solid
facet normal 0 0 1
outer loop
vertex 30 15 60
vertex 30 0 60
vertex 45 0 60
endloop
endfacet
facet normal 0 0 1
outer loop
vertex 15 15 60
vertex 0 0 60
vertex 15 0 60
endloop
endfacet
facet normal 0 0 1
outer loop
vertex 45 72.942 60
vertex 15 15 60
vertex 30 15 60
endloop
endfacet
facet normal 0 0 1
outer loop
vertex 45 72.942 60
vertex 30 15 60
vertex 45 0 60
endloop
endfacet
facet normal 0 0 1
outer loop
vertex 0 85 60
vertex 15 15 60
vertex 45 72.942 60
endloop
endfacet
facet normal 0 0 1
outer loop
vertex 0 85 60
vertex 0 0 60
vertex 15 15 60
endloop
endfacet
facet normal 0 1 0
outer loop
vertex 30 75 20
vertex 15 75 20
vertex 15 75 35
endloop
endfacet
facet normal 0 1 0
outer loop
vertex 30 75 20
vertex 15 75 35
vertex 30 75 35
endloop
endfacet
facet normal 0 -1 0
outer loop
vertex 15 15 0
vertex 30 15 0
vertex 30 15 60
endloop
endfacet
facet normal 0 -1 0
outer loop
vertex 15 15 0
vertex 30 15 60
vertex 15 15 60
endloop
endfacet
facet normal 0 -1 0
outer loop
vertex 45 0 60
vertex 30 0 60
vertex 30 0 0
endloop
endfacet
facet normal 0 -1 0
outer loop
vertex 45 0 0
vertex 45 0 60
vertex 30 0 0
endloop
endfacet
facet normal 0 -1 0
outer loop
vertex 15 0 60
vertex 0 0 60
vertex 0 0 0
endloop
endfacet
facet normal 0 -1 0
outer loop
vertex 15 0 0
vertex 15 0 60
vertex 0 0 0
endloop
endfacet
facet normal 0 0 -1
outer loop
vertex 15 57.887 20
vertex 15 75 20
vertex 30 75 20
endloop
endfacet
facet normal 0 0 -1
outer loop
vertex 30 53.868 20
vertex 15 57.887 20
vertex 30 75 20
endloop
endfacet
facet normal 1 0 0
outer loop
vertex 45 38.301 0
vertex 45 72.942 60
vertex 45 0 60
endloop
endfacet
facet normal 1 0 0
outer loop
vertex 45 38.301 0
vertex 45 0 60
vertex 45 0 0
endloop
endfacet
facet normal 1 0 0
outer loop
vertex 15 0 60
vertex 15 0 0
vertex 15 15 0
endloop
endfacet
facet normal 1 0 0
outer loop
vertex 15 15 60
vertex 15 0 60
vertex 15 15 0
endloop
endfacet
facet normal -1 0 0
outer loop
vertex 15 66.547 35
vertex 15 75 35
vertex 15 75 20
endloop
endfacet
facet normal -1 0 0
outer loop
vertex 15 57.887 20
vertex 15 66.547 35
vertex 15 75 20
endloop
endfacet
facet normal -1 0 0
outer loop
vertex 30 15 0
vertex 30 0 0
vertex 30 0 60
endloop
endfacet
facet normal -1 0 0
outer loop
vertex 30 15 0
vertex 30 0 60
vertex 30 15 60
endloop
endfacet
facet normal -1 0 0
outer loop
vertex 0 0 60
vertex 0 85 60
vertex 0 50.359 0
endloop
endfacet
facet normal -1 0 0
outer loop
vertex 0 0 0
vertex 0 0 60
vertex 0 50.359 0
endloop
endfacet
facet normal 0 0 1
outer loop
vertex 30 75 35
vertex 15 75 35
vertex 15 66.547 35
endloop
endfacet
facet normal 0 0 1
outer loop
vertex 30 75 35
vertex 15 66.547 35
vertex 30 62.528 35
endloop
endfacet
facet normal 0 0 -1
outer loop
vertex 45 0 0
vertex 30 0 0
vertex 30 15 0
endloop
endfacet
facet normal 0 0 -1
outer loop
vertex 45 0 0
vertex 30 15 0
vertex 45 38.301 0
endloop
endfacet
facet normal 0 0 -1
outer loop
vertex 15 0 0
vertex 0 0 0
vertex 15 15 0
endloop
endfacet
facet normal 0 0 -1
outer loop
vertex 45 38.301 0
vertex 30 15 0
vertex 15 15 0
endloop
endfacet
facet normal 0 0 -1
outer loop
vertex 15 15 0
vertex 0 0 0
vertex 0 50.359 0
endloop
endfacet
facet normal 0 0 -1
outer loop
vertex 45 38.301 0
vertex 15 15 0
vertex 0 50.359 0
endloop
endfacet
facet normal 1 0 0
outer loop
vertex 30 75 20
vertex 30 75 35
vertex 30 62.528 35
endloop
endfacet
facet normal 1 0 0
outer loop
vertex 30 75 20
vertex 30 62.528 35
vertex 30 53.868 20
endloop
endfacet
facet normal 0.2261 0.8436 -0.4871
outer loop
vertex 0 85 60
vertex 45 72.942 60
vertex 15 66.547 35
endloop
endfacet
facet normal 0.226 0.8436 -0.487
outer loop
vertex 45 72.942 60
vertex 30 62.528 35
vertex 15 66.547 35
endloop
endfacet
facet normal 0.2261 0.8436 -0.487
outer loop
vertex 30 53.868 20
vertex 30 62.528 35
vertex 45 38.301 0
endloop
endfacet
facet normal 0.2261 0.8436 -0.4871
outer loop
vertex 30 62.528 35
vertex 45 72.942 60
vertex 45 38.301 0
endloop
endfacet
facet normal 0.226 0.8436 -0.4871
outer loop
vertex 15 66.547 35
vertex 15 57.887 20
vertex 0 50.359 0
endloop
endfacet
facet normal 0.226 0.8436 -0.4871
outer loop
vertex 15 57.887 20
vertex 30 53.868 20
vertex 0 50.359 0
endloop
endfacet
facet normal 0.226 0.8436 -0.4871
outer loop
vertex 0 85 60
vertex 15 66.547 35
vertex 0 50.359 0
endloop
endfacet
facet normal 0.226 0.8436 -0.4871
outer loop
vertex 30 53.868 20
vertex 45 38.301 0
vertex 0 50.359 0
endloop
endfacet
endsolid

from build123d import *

# Parameters (mm, degrees)
ESBO_O1_W                = 60
ESBO_O1_H                = 85
RESSALTO_EXTRUS_O1_DEPTH = 45
CORTE_EXTRUS_O1_REACH    = 102.9
ESBO_O7_W                = 70
ESBO_O7_H                = 90
RESSALTO_EXTRUS_O2_REACH = 108.066
ESBO_O8_W                = 15
ESBO_O8_H                = 15
CORTE_EXTRUS_O2_REACH    = 115.358
ESBO_O9_W                = 15
ESBO_O9_H                = 15


with BuildPart() as part:
    # Esboço1 → Ressalto-extrusão1 (new body)
    with BuildSketch(Plane(origin=(0, 0, 0), x_dir=(0, 0, -1), z_dir=(1, 0, 0))):
        with Locations((-30, 42.5)):
            Rectangle(ESBO_O1_W, ESBO_O1_H)
    extrude(amount=RESSALTO_EXTRUS_O1_DEPTH)

    # Esboço7 → Corte-extrusão1 (cut, up to next)
    with BuildSketch(Plane(origin=(9.603131429, 35.839374403, -20.691872459), x_dir=(-0.9741169476962972, 0.19576038710152016, -0.11302231218972801), z_dir=(-0.22604462437945605, -0.8436100229619508, 0.48705847384814865)), mode=Mode.PRIVATE) as corte_extrus_o1_sk1:
        with Locations((-10.222277995, -55.295886242)):
            Rectangle(ESBO_O7_W, ESBO_O7_H)
    corte_extrus_o1_tool1 = extrude(corte_extrus_o1_sk1.sketch, amount=-CORTE_EXTRUS_O1_REACH, mode=Mode.PRIVATE) & part.part
    add(corte_extrus_o1_tool1.solids().sort_by_distance((19.560826, 61.4862, 28.351115))[0], mode=Mode.SUBTRACT)

    # Ressalto-extrusão2: up to this plane
    ressalto_extrus_o2_end = Plane(origin=(9.603131429, 35.839374403, -20.691872459), z_dir=(-0.22604462437945594, -0.8436100229619508, 0.4870584738481487))
    # Esboço8 → Ressalto-extrusão2 (add, up to the surface)
    with BuildSketch(Plane(origin=(0, 75, 0), x_dir=(1, 0, 0), z_dir=(0, 1, 0)), mode=Mode.PRIVATE) as ressalto_extrus_o2_sk1:
        with Locations((22.5, -27.5)):
            Rectangle(ESBO_O8_W, ESBO_O8_H)
    ressalto_extrus_o2_tool1 = split(extrude(ressalto_extrus_o2_sk1.sketch, amount=-RESSALTO_EXTRUS_O2_REACH, mode=Mode.PRIVATE), bisect_by=ressalto_extrus_o2_end, keep=Keep.BOTH, mode=Mode.PRIVATE)
    add(ressalto_extrus_o2_tool1.solids().sort_by_distance((22.5, 75, 27.5))[0])

    # Esboço9 → Corte-extrusão2 (cut, up to next)
    with BuildSketch(Plane(origin=(0, 0, 0), x_dir=(-1, 0, 0), z_dir=(0, 0, -1)), mode=Mode.PRIVATE) as corte_extrus_o2_sk1:
        with Locations((-22.5, 7.5)):
            Rectangle(ESBO_O9_W, ESBO_O9_H)
    corte_extrus_o2_tool1 = extrude(corte_extrus_o2_sk1.sketch, amount=-CORTE_EXTRUS_O2_REACH, mode=Mode.PRIVATE) & part.part
    add(corte_extrus_o2_tool1.solids().sort_by_distance((22.5, 7.5, 0))[0], mode=Mode.SUBTRACT)


solid = part.part
